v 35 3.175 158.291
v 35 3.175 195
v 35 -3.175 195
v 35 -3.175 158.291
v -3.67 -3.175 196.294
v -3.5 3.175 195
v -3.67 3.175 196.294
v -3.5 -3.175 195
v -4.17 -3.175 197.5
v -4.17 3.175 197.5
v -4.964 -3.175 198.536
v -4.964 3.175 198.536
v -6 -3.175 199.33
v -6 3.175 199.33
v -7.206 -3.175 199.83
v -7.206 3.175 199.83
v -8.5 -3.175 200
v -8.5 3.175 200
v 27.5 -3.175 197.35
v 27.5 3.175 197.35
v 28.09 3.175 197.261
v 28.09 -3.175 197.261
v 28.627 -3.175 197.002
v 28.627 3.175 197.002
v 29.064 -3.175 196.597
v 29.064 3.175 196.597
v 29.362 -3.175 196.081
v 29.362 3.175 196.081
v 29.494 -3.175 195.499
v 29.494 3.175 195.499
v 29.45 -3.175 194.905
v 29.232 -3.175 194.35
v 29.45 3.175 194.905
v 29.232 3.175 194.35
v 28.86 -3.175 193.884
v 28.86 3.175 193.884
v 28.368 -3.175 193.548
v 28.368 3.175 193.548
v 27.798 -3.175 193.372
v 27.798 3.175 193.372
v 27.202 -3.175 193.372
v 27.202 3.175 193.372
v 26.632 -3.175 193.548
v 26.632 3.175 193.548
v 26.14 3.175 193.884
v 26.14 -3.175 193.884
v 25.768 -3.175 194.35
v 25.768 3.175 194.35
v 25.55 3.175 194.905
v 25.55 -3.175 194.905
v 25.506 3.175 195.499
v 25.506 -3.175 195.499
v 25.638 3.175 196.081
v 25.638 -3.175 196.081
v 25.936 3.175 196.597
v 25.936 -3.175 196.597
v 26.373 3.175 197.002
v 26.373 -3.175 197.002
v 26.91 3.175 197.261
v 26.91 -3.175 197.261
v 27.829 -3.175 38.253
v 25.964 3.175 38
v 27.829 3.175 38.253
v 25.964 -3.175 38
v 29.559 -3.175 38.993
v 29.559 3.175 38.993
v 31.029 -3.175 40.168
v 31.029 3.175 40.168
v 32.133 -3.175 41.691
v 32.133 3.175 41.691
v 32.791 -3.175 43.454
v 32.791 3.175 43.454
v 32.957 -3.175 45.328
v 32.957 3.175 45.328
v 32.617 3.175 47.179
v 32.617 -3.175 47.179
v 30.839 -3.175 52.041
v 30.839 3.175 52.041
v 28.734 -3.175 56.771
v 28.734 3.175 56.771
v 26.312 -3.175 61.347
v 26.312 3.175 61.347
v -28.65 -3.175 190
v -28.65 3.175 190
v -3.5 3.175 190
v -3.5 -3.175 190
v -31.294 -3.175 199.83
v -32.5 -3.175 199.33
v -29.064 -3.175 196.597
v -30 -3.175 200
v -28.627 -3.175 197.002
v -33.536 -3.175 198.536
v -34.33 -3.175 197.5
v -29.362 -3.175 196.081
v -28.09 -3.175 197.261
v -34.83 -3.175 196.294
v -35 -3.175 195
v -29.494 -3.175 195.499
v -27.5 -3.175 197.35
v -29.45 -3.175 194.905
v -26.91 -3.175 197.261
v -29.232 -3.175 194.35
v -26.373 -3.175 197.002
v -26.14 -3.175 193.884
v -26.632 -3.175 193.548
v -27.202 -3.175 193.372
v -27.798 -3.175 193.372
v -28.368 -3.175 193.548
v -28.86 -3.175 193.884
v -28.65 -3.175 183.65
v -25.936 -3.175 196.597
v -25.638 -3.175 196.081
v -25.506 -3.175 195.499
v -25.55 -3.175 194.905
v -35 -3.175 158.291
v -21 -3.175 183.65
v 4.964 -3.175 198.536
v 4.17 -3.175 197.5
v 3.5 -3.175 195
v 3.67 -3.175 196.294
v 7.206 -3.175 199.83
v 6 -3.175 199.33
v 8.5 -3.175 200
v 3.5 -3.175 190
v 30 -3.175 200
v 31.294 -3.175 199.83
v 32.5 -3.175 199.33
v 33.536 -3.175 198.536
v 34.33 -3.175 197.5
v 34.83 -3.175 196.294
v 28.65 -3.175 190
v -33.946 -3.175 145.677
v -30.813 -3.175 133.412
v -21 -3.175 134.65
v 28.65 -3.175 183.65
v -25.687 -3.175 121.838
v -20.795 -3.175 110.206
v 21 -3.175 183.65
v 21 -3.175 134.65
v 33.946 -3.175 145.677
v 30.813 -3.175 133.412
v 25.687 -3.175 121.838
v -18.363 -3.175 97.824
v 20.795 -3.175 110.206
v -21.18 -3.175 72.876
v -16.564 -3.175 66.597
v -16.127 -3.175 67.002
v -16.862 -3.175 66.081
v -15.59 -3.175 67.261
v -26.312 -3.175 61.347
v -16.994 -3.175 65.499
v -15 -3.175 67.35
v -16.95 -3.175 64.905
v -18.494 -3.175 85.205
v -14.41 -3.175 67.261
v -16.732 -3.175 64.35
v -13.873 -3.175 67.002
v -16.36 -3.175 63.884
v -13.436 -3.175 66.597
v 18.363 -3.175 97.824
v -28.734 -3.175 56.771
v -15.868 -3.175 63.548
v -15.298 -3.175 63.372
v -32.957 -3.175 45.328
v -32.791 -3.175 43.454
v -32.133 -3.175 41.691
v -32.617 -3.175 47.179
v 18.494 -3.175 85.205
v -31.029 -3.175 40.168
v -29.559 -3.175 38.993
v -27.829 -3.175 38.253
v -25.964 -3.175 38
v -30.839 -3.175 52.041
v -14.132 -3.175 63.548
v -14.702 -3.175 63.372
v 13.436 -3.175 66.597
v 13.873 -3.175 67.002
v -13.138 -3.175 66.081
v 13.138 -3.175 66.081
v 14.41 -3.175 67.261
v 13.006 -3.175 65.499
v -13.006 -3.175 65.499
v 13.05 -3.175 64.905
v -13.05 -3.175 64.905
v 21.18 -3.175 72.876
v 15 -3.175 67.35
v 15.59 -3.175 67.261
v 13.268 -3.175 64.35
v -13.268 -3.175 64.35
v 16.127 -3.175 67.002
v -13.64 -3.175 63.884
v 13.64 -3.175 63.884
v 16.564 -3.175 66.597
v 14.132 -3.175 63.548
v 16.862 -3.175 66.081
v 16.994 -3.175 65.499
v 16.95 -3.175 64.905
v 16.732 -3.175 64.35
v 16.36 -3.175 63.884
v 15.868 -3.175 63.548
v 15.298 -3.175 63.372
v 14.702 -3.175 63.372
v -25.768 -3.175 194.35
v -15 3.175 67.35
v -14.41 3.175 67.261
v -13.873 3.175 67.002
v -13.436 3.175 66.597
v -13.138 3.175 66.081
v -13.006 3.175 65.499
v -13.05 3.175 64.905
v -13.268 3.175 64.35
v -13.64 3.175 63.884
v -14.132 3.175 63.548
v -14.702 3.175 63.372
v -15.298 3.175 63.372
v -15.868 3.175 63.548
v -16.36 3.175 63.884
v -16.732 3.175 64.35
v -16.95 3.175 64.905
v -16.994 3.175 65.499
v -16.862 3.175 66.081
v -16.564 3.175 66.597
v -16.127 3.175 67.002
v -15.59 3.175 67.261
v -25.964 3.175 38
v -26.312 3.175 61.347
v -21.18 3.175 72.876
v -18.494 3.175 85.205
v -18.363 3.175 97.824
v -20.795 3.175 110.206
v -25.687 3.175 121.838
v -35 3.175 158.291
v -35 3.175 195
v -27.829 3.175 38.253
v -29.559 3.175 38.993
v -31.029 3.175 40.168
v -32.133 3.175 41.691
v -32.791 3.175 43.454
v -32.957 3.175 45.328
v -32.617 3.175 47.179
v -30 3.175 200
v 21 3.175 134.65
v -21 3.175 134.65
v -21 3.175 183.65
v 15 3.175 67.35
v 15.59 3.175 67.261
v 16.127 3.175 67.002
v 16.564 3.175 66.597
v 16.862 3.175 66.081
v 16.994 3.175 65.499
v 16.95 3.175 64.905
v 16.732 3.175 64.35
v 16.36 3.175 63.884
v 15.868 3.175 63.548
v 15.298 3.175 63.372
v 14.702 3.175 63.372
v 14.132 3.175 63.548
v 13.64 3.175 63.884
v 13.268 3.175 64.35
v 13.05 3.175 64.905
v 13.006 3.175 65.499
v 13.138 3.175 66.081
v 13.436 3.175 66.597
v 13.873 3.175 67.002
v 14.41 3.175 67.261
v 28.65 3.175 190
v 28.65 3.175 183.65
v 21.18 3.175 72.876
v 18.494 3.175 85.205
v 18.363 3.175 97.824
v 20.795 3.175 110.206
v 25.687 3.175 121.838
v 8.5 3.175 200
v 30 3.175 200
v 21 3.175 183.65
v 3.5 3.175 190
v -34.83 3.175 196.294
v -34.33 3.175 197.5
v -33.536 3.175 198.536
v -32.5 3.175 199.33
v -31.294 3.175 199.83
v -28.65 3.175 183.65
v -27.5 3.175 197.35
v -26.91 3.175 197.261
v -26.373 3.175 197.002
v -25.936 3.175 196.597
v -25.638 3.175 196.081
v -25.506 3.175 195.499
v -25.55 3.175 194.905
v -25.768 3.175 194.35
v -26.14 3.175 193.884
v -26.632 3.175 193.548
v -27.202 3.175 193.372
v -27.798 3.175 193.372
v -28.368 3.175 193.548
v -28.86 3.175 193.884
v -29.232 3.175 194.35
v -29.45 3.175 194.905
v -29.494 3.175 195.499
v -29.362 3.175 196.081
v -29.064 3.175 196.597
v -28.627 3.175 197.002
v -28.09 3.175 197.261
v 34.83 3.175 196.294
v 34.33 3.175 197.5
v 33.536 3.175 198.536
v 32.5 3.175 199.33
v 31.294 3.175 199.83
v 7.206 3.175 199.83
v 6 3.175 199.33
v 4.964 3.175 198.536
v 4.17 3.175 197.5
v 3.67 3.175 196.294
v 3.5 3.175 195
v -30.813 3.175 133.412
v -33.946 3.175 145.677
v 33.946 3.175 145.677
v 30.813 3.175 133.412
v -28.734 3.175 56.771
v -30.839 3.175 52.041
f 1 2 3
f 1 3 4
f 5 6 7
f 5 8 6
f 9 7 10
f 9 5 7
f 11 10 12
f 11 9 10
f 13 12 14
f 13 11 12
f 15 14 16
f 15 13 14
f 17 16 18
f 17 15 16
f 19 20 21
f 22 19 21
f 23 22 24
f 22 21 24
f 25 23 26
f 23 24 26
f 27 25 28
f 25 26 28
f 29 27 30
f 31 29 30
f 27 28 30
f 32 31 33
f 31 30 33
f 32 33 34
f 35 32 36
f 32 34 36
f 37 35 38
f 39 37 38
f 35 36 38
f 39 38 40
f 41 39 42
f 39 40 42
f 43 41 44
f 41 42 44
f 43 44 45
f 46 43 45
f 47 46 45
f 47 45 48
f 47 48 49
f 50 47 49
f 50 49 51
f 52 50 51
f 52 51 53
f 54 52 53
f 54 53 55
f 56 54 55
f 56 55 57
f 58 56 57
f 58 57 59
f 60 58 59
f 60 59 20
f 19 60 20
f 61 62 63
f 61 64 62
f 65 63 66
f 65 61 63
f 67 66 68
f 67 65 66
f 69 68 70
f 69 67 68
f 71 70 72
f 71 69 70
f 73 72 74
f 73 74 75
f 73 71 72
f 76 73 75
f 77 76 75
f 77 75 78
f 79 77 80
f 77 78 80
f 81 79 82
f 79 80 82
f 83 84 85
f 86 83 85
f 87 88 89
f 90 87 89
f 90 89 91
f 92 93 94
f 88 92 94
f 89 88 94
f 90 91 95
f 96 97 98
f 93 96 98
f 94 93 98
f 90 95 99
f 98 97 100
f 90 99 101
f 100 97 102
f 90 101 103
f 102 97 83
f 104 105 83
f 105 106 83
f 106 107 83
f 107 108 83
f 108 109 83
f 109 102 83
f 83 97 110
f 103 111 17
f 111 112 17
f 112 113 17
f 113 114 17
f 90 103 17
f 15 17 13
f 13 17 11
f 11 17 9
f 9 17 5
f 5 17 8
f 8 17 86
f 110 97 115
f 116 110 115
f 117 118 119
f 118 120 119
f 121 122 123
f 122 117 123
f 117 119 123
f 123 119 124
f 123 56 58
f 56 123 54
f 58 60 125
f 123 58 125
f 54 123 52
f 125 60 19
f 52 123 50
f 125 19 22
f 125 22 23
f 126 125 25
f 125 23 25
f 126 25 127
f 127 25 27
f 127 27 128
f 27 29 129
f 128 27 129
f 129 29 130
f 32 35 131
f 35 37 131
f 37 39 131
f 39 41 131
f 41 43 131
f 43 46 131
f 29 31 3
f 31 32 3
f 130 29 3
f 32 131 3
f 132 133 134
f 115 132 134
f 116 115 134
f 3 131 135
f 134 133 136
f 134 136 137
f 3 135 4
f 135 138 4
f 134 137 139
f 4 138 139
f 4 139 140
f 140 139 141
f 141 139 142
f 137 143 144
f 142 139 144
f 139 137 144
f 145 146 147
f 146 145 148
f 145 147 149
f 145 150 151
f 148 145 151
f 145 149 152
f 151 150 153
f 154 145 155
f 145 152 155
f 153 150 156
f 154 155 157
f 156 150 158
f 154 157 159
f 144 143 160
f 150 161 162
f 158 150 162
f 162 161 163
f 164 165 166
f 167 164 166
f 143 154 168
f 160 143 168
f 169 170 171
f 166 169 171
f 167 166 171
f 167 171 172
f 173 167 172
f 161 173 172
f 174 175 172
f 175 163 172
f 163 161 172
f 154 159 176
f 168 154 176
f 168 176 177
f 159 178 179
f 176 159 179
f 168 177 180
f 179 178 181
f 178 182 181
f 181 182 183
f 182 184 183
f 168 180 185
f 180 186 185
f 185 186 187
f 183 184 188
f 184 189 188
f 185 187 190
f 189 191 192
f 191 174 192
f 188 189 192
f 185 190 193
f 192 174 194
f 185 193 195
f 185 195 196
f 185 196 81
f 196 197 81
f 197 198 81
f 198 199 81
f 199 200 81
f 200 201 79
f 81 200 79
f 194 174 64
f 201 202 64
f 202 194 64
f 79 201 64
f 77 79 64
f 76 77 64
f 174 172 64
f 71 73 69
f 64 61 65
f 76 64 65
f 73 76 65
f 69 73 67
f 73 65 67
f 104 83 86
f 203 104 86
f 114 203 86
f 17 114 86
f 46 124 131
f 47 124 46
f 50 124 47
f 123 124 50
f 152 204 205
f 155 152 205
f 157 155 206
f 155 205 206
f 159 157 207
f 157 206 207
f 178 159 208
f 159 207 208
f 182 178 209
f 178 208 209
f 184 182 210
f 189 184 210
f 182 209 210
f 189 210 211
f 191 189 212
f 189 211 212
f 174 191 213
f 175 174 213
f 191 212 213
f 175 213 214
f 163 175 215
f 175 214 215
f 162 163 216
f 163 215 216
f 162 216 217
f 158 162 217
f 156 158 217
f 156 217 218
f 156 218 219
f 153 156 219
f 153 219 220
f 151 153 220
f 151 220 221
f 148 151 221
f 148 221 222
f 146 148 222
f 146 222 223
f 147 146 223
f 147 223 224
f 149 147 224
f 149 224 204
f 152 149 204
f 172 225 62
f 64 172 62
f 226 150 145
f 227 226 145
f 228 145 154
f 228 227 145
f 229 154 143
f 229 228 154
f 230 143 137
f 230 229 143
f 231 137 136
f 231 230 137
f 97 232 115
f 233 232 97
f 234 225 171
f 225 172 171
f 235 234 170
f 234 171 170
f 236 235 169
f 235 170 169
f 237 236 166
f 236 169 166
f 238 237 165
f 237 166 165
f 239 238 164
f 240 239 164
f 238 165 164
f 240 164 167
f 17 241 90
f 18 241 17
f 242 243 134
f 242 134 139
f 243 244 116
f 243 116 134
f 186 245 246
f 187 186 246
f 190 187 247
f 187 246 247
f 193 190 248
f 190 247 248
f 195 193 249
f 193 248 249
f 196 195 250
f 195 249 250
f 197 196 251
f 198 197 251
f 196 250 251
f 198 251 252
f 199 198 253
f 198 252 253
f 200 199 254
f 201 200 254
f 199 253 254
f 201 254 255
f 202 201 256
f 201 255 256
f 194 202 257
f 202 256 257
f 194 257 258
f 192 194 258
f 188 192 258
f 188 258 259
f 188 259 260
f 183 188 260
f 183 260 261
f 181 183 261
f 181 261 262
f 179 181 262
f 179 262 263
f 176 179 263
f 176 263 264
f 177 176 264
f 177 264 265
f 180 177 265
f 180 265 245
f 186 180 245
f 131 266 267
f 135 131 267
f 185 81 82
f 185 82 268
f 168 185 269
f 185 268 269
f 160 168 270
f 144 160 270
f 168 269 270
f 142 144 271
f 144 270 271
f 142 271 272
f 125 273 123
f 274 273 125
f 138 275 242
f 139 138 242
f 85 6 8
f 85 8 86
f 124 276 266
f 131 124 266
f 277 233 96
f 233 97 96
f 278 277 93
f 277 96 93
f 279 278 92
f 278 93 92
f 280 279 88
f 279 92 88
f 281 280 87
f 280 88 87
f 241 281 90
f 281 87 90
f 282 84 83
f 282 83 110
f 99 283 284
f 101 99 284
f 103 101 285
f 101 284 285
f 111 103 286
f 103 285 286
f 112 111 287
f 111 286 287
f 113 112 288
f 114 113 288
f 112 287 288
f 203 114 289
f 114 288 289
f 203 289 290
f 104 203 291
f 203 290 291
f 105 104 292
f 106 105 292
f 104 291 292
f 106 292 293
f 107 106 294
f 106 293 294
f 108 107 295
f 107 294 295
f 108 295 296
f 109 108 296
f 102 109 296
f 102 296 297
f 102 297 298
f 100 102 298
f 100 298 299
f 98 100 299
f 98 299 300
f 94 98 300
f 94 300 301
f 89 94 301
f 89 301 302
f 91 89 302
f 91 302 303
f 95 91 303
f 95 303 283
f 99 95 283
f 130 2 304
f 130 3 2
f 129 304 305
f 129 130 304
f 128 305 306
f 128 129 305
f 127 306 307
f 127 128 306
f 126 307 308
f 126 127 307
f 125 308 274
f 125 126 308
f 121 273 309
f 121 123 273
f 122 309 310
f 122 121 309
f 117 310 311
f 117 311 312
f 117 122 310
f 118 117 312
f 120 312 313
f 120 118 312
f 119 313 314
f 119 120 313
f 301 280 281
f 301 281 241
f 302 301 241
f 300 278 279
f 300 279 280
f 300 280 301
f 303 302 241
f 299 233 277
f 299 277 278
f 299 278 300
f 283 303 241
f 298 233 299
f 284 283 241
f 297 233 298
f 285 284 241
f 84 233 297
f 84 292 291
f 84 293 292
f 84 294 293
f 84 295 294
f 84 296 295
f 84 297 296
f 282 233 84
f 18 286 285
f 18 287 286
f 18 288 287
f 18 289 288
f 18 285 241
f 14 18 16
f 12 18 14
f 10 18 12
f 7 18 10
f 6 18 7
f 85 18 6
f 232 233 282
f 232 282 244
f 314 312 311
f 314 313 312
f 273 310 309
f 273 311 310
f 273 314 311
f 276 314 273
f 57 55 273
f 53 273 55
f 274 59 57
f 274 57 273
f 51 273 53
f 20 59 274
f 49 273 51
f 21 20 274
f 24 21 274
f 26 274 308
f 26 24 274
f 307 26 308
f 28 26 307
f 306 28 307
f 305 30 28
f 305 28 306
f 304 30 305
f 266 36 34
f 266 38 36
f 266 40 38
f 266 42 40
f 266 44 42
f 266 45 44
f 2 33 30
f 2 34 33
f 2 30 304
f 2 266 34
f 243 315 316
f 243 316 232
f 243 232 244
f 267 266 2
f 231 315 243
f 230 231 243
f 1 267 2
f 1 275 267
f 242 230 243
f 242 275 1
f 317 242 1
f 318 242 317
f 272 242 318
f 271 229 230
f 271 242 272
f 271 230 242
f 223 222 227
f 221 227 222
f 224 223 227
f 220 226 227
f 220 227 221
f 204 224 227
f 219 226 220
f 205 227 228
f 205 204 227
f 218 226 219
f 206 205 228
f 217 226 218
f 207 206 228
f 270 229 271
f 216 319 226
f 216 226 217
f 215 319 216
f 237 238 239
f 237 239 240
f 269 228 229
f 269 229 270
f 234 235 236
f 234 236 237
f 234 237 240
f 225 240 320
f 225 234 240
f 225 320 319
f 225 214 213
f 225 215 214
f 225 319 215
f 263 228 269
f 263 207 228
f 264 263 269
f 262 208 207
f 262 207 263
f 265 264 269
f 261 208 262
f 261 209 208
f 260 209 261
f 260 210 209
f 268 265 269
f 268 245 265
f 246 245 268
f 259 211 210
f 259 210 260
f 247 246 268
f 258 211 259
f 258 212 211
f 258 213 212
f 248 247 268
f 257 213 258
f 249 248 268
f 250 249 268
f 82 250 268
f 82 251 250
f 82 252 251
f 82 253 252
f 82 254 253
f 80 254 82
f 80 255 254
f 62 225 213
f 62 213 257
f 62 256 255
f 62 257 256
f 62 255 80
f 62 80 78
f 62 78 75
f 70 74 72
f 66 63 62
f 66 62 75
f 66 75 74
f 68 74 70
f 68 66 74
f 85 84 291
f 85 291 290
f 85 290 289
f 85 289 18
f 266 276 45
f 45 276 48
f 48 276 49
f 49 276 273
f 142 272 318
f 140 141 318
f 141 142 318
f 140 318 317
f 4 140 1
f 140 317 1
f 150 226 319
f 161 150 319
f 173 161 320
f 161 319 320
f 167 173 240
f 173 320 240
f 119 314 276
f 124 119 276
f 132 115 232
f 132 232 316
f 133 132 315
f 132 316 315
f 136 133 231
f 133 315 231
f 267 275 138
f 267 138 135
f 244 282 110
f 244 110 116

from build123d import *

# Parameters (mm, degrees)
BOSS_EXTRUDE1_DEPTH = 3.175
CUT_EXTRUDE1_DEPTH  = 204.138678001
SKETCH3_W           = 42
SKETCH3_H           = 55.35
SKETCH3_W_2         = 7
SKETCH3_H_2         = 10
SKETCH3_W_3         = 7.65
SKETCH3_H_3         = 6.35
CUT_EXTRUDE2_DEPTH  = 204.138678001
FILLET3_R           = 5
SKETCH4_R           = 2
CUT_EXTRUDE3_DEPTH  = 204.138678001
CUT_EXTRUDE4_DEPTH  = 204.138678001
FILLET4_R           = 76
FILLET5_R           = 7


with BuildPart() as part:
    # Sketch1 → Boss-Extrude1 (new, symmetric)
    with BuildSketch(Plane(origin=(0, 0, 0), x_dir=(1, 0, 0), z_dir=(0, 1, 0))):
        with BuildLine():
            Line((35, -200), (35, 0))
            ThreePointArc((35, 0), (0, 35), (-35, 0))
            Line((-35, 0), (-35, -200))
            Line((-35, -200), (35, -200))
        make_face()
    extrude(amount=BOSS_EXTRUDE1_DEPTH, both=True)

    # Sketch2 → Cut-Extrude1 (cut, through all)
    with BuildSketch(Plane(origin=(0, 3.175, 0), x_dir=(1, 0, 0), z_dir=(0, 1, 0))):
        with BuildLine():
            Line((-35, -38), (35, -38))
            Line((35, -38), (35, 0))
            ThreePointArc((35, 0), (0, 35), (-35, 0))
            Line((-35, 0), (-35, -38))
        make_face()
    extrude(amount=-CUT_EXTRUDE1_DEPTH, mode=Mode.SUBTRACT)

    # Sketch3 → Cut-Extrude2 (cut, through all)
    with BuildSketch(Plane(origin=(0, 3.175, 0), x_dir=(1, 0, 0), z_dir=(0, 1, 0))):
        with Locations((0, -162.325)):
            Rectangle(SKETCH3_W, SKETCH3_H)
        with Locations((0, -195)):
            Rectangle(SKETCH3_W_2, SKETCH3_H_2)
        with Locations((-24.825, -186.825)):
            Rectangle(SKETCH3_W_3, SKETCH3_H_3)
        with Locations((24.825, -186.825)):
            Rectangle(SKETCH3_W_3, SKETCH3_H_3)
    extrude(amount=-CUT_EXTRUDE2_DEPTH, mode=Mode.SUBTRACT)

    # Fillet3
    fillet3_edges = [part.edges().sort_by_distance(p)[0] for p in [
        (3.5, 0, 200),
        (-3.5, 0, 200),
        (35, 0, 200),
        (-35, 0, 200),
    ]]
    fillet(fillet3_edges, radius=FILLET3_R)

    # Sketch4 → Cut-Extrude3 (cut, through all)
    with BuildSketch(Plane(origin=(0, 3.175, 0), x_dir=(1, 0, 0), z_dir=(0, 1, 0))):
        with Locations(Location((15, -65.35, 0), (0, 0, 270))):
            Circle(SKETCH4_R)
        with Locations(Location((-15, -65.35, 0), (0, 0, 270))):
            Circle(SKETCH4_R)
        with Locations(Location((27.5, -195.35, 0), (0, 0, 270))):
            Circle(SKETCH4_R)
        with Locations(Location((-27.5, -195.35, 0), (0, 0, 270))):
            Circle(SKETCH4_R)
    extrude(amount=-CUT_EXTRUDE3_DEPTH, mode=Mode.SUBTRACT)

    # Sketch5 → Cut-Extrude4 (cut, through all)
    with BuildSketch(Plane(origin=(0, 3.175, 0), x_dir=(1, 0, 0), z_dir=(0, 1, 0))):
        with BuildLine():
            Line((-35, -134.65), (-35, -49.65))
            ThreePointArc((-35, -49.65), (-18.102907984, -92.15), (-35, -134.65))
        make_face()
    cut_extrude4 = extrude(amount=-CUT_EXTRUDE4_DEPTH, mode=Mode.SUBTRACT)

    # Mirror1: Cut-Extrude4 across plane
    add(cut_extrude4.mirror(Plane(origin=(0, 0, 0), x_dir=(0, 0, 1), z_dir=(1, 0, 0))), mode=Mode.SUBTRACT)

    # Fillet4
    # the kernel refuses this fillet: 76 mm, written as the material it takes off along each edge
    with BuildSketch(Plane(origin=(-35, 39.601520625, 49.65), x_dir=(0, 0, -1), z_dir=(0, -1, 0))) as fillet4_piece_1:
        with BuildLine():
            CenterArc((26.124451555, 74.608915367), FILLET4_R, 240.155370723, 18.865389254)
            Line((-11.696928446, 8.688181035), (-12.453356046, 7.369766348))
            ThreePointArc((-12.453356046, 7.369766348), (-6.498269887, 3.469254885), (-1.04366777, -1.105059992))
            Line((-1.04366777, -1.105059992), (0, -1.52))
            ThreePointArc((0, -1.52), (5.825, -1.52), (11.360510969, -1.492178307))
            Line((11.360510969, -1.492178307), (11.65, 0))
        make_face()
    extrude(amount=79.20304125, mode=Mode.SUBTRACT)
    with BuildSketch(Plane(origin=(-35, 62.277048415, 134.65), x_dir=(0.587963491001448, 0, -0.8088874663693276), z_dir=(0, -1, 0))) as fillet4_piece_2:
        with BuildLine():
            CenterArc((25.562462836, 75.375386129), FILLET4_R, 233.987375861, 28.66182532)
            Line((-19.12276248, 13.899938684), (-20.016466986, 12.670429736))
            Line((-20.016466986, 12.670429736), (-0.893704506, -1.229508949))
            Line((-0.893704506, -1.229508949), (0.194474848, -1.507507723))
            ThreePointArc((0.194474848, -1.507507723), (7.919360226, -1.011292338), (15.644245604, -1.507507723))
            Line((15.644245604, -1.507507723), (15.838720451, 0))
        make_face()
    extrude(amount=124.554096829, mode=Mode.SUBTRACT)
    with BuildSketch(Plane(origin=(35, 62.277048415, 134.65), x_dir=(-0.587963491001448, 0, -0.8088874663693276), z_dir=(0, -1, 0))) as fillet4_piece_3:
        with BuildLine():
            CenterArc((25.562462836, -75.375386129), FILLET4_R, 97.350798819, 28.66182532)
            Line((-19.12276248, -13.899938684), (-20.016466986, -12.670429736))
            Line((-20.016466986, -12.670429736), (-0.893704506, 1.229508949))
            Line((-0.893704506, 1.229508949), (0.194474848, 1.507507723))
            ThreePointArc((0.194474848, 1.507507723), (7.919360226, 1.011292338), (15.644245604, 1.507507723))
            Line((15.644245604, 1.507507723), (15.838720451, 0))
        make_face()
    extrude(amount=124.554096829, mode=Mode.SUBTRACT)
    with BuildSketch(Plane(origin=(35, 39.601520625, 49.65), x_dir=(0, 0, -1), z_dir=(0, -1, 0))) as fillet4_piece_4:
        with BuildLine():
            CenterArc((26.124451555, -74.608915367), FILLET4_R, 100.979240023, 18.865389254)
            Line((-11.696928446, -8.688181035), (-12.453356046, -7.369766348))
            ThreePointArc((-12.453356046, -7.369766348), (-6.498269887, -3.469254885), (-1.04366777, 1.105059992))
            Line((-1.04366777, 1.105059992), (0, 1.52))
            ThreePointArc((0, 1.52), (5.825, 1.52), (11.360510969, 1.492178307))
            Line((11.360510969, 1.492178307), (11.65, 0))
        make_face()
    extrude(amount=79.20304125, mode=Mode.SUBTRACT)

    # Fillet5
    fillet5_edges = [part.edges().sort_by_distance(p)[0] for p in [
        (35, 0, 38),
        (-35, 0, 38),
    ]]
    fillet(fillet5_edges, radius=FILLET5_R)


solid = part.part
